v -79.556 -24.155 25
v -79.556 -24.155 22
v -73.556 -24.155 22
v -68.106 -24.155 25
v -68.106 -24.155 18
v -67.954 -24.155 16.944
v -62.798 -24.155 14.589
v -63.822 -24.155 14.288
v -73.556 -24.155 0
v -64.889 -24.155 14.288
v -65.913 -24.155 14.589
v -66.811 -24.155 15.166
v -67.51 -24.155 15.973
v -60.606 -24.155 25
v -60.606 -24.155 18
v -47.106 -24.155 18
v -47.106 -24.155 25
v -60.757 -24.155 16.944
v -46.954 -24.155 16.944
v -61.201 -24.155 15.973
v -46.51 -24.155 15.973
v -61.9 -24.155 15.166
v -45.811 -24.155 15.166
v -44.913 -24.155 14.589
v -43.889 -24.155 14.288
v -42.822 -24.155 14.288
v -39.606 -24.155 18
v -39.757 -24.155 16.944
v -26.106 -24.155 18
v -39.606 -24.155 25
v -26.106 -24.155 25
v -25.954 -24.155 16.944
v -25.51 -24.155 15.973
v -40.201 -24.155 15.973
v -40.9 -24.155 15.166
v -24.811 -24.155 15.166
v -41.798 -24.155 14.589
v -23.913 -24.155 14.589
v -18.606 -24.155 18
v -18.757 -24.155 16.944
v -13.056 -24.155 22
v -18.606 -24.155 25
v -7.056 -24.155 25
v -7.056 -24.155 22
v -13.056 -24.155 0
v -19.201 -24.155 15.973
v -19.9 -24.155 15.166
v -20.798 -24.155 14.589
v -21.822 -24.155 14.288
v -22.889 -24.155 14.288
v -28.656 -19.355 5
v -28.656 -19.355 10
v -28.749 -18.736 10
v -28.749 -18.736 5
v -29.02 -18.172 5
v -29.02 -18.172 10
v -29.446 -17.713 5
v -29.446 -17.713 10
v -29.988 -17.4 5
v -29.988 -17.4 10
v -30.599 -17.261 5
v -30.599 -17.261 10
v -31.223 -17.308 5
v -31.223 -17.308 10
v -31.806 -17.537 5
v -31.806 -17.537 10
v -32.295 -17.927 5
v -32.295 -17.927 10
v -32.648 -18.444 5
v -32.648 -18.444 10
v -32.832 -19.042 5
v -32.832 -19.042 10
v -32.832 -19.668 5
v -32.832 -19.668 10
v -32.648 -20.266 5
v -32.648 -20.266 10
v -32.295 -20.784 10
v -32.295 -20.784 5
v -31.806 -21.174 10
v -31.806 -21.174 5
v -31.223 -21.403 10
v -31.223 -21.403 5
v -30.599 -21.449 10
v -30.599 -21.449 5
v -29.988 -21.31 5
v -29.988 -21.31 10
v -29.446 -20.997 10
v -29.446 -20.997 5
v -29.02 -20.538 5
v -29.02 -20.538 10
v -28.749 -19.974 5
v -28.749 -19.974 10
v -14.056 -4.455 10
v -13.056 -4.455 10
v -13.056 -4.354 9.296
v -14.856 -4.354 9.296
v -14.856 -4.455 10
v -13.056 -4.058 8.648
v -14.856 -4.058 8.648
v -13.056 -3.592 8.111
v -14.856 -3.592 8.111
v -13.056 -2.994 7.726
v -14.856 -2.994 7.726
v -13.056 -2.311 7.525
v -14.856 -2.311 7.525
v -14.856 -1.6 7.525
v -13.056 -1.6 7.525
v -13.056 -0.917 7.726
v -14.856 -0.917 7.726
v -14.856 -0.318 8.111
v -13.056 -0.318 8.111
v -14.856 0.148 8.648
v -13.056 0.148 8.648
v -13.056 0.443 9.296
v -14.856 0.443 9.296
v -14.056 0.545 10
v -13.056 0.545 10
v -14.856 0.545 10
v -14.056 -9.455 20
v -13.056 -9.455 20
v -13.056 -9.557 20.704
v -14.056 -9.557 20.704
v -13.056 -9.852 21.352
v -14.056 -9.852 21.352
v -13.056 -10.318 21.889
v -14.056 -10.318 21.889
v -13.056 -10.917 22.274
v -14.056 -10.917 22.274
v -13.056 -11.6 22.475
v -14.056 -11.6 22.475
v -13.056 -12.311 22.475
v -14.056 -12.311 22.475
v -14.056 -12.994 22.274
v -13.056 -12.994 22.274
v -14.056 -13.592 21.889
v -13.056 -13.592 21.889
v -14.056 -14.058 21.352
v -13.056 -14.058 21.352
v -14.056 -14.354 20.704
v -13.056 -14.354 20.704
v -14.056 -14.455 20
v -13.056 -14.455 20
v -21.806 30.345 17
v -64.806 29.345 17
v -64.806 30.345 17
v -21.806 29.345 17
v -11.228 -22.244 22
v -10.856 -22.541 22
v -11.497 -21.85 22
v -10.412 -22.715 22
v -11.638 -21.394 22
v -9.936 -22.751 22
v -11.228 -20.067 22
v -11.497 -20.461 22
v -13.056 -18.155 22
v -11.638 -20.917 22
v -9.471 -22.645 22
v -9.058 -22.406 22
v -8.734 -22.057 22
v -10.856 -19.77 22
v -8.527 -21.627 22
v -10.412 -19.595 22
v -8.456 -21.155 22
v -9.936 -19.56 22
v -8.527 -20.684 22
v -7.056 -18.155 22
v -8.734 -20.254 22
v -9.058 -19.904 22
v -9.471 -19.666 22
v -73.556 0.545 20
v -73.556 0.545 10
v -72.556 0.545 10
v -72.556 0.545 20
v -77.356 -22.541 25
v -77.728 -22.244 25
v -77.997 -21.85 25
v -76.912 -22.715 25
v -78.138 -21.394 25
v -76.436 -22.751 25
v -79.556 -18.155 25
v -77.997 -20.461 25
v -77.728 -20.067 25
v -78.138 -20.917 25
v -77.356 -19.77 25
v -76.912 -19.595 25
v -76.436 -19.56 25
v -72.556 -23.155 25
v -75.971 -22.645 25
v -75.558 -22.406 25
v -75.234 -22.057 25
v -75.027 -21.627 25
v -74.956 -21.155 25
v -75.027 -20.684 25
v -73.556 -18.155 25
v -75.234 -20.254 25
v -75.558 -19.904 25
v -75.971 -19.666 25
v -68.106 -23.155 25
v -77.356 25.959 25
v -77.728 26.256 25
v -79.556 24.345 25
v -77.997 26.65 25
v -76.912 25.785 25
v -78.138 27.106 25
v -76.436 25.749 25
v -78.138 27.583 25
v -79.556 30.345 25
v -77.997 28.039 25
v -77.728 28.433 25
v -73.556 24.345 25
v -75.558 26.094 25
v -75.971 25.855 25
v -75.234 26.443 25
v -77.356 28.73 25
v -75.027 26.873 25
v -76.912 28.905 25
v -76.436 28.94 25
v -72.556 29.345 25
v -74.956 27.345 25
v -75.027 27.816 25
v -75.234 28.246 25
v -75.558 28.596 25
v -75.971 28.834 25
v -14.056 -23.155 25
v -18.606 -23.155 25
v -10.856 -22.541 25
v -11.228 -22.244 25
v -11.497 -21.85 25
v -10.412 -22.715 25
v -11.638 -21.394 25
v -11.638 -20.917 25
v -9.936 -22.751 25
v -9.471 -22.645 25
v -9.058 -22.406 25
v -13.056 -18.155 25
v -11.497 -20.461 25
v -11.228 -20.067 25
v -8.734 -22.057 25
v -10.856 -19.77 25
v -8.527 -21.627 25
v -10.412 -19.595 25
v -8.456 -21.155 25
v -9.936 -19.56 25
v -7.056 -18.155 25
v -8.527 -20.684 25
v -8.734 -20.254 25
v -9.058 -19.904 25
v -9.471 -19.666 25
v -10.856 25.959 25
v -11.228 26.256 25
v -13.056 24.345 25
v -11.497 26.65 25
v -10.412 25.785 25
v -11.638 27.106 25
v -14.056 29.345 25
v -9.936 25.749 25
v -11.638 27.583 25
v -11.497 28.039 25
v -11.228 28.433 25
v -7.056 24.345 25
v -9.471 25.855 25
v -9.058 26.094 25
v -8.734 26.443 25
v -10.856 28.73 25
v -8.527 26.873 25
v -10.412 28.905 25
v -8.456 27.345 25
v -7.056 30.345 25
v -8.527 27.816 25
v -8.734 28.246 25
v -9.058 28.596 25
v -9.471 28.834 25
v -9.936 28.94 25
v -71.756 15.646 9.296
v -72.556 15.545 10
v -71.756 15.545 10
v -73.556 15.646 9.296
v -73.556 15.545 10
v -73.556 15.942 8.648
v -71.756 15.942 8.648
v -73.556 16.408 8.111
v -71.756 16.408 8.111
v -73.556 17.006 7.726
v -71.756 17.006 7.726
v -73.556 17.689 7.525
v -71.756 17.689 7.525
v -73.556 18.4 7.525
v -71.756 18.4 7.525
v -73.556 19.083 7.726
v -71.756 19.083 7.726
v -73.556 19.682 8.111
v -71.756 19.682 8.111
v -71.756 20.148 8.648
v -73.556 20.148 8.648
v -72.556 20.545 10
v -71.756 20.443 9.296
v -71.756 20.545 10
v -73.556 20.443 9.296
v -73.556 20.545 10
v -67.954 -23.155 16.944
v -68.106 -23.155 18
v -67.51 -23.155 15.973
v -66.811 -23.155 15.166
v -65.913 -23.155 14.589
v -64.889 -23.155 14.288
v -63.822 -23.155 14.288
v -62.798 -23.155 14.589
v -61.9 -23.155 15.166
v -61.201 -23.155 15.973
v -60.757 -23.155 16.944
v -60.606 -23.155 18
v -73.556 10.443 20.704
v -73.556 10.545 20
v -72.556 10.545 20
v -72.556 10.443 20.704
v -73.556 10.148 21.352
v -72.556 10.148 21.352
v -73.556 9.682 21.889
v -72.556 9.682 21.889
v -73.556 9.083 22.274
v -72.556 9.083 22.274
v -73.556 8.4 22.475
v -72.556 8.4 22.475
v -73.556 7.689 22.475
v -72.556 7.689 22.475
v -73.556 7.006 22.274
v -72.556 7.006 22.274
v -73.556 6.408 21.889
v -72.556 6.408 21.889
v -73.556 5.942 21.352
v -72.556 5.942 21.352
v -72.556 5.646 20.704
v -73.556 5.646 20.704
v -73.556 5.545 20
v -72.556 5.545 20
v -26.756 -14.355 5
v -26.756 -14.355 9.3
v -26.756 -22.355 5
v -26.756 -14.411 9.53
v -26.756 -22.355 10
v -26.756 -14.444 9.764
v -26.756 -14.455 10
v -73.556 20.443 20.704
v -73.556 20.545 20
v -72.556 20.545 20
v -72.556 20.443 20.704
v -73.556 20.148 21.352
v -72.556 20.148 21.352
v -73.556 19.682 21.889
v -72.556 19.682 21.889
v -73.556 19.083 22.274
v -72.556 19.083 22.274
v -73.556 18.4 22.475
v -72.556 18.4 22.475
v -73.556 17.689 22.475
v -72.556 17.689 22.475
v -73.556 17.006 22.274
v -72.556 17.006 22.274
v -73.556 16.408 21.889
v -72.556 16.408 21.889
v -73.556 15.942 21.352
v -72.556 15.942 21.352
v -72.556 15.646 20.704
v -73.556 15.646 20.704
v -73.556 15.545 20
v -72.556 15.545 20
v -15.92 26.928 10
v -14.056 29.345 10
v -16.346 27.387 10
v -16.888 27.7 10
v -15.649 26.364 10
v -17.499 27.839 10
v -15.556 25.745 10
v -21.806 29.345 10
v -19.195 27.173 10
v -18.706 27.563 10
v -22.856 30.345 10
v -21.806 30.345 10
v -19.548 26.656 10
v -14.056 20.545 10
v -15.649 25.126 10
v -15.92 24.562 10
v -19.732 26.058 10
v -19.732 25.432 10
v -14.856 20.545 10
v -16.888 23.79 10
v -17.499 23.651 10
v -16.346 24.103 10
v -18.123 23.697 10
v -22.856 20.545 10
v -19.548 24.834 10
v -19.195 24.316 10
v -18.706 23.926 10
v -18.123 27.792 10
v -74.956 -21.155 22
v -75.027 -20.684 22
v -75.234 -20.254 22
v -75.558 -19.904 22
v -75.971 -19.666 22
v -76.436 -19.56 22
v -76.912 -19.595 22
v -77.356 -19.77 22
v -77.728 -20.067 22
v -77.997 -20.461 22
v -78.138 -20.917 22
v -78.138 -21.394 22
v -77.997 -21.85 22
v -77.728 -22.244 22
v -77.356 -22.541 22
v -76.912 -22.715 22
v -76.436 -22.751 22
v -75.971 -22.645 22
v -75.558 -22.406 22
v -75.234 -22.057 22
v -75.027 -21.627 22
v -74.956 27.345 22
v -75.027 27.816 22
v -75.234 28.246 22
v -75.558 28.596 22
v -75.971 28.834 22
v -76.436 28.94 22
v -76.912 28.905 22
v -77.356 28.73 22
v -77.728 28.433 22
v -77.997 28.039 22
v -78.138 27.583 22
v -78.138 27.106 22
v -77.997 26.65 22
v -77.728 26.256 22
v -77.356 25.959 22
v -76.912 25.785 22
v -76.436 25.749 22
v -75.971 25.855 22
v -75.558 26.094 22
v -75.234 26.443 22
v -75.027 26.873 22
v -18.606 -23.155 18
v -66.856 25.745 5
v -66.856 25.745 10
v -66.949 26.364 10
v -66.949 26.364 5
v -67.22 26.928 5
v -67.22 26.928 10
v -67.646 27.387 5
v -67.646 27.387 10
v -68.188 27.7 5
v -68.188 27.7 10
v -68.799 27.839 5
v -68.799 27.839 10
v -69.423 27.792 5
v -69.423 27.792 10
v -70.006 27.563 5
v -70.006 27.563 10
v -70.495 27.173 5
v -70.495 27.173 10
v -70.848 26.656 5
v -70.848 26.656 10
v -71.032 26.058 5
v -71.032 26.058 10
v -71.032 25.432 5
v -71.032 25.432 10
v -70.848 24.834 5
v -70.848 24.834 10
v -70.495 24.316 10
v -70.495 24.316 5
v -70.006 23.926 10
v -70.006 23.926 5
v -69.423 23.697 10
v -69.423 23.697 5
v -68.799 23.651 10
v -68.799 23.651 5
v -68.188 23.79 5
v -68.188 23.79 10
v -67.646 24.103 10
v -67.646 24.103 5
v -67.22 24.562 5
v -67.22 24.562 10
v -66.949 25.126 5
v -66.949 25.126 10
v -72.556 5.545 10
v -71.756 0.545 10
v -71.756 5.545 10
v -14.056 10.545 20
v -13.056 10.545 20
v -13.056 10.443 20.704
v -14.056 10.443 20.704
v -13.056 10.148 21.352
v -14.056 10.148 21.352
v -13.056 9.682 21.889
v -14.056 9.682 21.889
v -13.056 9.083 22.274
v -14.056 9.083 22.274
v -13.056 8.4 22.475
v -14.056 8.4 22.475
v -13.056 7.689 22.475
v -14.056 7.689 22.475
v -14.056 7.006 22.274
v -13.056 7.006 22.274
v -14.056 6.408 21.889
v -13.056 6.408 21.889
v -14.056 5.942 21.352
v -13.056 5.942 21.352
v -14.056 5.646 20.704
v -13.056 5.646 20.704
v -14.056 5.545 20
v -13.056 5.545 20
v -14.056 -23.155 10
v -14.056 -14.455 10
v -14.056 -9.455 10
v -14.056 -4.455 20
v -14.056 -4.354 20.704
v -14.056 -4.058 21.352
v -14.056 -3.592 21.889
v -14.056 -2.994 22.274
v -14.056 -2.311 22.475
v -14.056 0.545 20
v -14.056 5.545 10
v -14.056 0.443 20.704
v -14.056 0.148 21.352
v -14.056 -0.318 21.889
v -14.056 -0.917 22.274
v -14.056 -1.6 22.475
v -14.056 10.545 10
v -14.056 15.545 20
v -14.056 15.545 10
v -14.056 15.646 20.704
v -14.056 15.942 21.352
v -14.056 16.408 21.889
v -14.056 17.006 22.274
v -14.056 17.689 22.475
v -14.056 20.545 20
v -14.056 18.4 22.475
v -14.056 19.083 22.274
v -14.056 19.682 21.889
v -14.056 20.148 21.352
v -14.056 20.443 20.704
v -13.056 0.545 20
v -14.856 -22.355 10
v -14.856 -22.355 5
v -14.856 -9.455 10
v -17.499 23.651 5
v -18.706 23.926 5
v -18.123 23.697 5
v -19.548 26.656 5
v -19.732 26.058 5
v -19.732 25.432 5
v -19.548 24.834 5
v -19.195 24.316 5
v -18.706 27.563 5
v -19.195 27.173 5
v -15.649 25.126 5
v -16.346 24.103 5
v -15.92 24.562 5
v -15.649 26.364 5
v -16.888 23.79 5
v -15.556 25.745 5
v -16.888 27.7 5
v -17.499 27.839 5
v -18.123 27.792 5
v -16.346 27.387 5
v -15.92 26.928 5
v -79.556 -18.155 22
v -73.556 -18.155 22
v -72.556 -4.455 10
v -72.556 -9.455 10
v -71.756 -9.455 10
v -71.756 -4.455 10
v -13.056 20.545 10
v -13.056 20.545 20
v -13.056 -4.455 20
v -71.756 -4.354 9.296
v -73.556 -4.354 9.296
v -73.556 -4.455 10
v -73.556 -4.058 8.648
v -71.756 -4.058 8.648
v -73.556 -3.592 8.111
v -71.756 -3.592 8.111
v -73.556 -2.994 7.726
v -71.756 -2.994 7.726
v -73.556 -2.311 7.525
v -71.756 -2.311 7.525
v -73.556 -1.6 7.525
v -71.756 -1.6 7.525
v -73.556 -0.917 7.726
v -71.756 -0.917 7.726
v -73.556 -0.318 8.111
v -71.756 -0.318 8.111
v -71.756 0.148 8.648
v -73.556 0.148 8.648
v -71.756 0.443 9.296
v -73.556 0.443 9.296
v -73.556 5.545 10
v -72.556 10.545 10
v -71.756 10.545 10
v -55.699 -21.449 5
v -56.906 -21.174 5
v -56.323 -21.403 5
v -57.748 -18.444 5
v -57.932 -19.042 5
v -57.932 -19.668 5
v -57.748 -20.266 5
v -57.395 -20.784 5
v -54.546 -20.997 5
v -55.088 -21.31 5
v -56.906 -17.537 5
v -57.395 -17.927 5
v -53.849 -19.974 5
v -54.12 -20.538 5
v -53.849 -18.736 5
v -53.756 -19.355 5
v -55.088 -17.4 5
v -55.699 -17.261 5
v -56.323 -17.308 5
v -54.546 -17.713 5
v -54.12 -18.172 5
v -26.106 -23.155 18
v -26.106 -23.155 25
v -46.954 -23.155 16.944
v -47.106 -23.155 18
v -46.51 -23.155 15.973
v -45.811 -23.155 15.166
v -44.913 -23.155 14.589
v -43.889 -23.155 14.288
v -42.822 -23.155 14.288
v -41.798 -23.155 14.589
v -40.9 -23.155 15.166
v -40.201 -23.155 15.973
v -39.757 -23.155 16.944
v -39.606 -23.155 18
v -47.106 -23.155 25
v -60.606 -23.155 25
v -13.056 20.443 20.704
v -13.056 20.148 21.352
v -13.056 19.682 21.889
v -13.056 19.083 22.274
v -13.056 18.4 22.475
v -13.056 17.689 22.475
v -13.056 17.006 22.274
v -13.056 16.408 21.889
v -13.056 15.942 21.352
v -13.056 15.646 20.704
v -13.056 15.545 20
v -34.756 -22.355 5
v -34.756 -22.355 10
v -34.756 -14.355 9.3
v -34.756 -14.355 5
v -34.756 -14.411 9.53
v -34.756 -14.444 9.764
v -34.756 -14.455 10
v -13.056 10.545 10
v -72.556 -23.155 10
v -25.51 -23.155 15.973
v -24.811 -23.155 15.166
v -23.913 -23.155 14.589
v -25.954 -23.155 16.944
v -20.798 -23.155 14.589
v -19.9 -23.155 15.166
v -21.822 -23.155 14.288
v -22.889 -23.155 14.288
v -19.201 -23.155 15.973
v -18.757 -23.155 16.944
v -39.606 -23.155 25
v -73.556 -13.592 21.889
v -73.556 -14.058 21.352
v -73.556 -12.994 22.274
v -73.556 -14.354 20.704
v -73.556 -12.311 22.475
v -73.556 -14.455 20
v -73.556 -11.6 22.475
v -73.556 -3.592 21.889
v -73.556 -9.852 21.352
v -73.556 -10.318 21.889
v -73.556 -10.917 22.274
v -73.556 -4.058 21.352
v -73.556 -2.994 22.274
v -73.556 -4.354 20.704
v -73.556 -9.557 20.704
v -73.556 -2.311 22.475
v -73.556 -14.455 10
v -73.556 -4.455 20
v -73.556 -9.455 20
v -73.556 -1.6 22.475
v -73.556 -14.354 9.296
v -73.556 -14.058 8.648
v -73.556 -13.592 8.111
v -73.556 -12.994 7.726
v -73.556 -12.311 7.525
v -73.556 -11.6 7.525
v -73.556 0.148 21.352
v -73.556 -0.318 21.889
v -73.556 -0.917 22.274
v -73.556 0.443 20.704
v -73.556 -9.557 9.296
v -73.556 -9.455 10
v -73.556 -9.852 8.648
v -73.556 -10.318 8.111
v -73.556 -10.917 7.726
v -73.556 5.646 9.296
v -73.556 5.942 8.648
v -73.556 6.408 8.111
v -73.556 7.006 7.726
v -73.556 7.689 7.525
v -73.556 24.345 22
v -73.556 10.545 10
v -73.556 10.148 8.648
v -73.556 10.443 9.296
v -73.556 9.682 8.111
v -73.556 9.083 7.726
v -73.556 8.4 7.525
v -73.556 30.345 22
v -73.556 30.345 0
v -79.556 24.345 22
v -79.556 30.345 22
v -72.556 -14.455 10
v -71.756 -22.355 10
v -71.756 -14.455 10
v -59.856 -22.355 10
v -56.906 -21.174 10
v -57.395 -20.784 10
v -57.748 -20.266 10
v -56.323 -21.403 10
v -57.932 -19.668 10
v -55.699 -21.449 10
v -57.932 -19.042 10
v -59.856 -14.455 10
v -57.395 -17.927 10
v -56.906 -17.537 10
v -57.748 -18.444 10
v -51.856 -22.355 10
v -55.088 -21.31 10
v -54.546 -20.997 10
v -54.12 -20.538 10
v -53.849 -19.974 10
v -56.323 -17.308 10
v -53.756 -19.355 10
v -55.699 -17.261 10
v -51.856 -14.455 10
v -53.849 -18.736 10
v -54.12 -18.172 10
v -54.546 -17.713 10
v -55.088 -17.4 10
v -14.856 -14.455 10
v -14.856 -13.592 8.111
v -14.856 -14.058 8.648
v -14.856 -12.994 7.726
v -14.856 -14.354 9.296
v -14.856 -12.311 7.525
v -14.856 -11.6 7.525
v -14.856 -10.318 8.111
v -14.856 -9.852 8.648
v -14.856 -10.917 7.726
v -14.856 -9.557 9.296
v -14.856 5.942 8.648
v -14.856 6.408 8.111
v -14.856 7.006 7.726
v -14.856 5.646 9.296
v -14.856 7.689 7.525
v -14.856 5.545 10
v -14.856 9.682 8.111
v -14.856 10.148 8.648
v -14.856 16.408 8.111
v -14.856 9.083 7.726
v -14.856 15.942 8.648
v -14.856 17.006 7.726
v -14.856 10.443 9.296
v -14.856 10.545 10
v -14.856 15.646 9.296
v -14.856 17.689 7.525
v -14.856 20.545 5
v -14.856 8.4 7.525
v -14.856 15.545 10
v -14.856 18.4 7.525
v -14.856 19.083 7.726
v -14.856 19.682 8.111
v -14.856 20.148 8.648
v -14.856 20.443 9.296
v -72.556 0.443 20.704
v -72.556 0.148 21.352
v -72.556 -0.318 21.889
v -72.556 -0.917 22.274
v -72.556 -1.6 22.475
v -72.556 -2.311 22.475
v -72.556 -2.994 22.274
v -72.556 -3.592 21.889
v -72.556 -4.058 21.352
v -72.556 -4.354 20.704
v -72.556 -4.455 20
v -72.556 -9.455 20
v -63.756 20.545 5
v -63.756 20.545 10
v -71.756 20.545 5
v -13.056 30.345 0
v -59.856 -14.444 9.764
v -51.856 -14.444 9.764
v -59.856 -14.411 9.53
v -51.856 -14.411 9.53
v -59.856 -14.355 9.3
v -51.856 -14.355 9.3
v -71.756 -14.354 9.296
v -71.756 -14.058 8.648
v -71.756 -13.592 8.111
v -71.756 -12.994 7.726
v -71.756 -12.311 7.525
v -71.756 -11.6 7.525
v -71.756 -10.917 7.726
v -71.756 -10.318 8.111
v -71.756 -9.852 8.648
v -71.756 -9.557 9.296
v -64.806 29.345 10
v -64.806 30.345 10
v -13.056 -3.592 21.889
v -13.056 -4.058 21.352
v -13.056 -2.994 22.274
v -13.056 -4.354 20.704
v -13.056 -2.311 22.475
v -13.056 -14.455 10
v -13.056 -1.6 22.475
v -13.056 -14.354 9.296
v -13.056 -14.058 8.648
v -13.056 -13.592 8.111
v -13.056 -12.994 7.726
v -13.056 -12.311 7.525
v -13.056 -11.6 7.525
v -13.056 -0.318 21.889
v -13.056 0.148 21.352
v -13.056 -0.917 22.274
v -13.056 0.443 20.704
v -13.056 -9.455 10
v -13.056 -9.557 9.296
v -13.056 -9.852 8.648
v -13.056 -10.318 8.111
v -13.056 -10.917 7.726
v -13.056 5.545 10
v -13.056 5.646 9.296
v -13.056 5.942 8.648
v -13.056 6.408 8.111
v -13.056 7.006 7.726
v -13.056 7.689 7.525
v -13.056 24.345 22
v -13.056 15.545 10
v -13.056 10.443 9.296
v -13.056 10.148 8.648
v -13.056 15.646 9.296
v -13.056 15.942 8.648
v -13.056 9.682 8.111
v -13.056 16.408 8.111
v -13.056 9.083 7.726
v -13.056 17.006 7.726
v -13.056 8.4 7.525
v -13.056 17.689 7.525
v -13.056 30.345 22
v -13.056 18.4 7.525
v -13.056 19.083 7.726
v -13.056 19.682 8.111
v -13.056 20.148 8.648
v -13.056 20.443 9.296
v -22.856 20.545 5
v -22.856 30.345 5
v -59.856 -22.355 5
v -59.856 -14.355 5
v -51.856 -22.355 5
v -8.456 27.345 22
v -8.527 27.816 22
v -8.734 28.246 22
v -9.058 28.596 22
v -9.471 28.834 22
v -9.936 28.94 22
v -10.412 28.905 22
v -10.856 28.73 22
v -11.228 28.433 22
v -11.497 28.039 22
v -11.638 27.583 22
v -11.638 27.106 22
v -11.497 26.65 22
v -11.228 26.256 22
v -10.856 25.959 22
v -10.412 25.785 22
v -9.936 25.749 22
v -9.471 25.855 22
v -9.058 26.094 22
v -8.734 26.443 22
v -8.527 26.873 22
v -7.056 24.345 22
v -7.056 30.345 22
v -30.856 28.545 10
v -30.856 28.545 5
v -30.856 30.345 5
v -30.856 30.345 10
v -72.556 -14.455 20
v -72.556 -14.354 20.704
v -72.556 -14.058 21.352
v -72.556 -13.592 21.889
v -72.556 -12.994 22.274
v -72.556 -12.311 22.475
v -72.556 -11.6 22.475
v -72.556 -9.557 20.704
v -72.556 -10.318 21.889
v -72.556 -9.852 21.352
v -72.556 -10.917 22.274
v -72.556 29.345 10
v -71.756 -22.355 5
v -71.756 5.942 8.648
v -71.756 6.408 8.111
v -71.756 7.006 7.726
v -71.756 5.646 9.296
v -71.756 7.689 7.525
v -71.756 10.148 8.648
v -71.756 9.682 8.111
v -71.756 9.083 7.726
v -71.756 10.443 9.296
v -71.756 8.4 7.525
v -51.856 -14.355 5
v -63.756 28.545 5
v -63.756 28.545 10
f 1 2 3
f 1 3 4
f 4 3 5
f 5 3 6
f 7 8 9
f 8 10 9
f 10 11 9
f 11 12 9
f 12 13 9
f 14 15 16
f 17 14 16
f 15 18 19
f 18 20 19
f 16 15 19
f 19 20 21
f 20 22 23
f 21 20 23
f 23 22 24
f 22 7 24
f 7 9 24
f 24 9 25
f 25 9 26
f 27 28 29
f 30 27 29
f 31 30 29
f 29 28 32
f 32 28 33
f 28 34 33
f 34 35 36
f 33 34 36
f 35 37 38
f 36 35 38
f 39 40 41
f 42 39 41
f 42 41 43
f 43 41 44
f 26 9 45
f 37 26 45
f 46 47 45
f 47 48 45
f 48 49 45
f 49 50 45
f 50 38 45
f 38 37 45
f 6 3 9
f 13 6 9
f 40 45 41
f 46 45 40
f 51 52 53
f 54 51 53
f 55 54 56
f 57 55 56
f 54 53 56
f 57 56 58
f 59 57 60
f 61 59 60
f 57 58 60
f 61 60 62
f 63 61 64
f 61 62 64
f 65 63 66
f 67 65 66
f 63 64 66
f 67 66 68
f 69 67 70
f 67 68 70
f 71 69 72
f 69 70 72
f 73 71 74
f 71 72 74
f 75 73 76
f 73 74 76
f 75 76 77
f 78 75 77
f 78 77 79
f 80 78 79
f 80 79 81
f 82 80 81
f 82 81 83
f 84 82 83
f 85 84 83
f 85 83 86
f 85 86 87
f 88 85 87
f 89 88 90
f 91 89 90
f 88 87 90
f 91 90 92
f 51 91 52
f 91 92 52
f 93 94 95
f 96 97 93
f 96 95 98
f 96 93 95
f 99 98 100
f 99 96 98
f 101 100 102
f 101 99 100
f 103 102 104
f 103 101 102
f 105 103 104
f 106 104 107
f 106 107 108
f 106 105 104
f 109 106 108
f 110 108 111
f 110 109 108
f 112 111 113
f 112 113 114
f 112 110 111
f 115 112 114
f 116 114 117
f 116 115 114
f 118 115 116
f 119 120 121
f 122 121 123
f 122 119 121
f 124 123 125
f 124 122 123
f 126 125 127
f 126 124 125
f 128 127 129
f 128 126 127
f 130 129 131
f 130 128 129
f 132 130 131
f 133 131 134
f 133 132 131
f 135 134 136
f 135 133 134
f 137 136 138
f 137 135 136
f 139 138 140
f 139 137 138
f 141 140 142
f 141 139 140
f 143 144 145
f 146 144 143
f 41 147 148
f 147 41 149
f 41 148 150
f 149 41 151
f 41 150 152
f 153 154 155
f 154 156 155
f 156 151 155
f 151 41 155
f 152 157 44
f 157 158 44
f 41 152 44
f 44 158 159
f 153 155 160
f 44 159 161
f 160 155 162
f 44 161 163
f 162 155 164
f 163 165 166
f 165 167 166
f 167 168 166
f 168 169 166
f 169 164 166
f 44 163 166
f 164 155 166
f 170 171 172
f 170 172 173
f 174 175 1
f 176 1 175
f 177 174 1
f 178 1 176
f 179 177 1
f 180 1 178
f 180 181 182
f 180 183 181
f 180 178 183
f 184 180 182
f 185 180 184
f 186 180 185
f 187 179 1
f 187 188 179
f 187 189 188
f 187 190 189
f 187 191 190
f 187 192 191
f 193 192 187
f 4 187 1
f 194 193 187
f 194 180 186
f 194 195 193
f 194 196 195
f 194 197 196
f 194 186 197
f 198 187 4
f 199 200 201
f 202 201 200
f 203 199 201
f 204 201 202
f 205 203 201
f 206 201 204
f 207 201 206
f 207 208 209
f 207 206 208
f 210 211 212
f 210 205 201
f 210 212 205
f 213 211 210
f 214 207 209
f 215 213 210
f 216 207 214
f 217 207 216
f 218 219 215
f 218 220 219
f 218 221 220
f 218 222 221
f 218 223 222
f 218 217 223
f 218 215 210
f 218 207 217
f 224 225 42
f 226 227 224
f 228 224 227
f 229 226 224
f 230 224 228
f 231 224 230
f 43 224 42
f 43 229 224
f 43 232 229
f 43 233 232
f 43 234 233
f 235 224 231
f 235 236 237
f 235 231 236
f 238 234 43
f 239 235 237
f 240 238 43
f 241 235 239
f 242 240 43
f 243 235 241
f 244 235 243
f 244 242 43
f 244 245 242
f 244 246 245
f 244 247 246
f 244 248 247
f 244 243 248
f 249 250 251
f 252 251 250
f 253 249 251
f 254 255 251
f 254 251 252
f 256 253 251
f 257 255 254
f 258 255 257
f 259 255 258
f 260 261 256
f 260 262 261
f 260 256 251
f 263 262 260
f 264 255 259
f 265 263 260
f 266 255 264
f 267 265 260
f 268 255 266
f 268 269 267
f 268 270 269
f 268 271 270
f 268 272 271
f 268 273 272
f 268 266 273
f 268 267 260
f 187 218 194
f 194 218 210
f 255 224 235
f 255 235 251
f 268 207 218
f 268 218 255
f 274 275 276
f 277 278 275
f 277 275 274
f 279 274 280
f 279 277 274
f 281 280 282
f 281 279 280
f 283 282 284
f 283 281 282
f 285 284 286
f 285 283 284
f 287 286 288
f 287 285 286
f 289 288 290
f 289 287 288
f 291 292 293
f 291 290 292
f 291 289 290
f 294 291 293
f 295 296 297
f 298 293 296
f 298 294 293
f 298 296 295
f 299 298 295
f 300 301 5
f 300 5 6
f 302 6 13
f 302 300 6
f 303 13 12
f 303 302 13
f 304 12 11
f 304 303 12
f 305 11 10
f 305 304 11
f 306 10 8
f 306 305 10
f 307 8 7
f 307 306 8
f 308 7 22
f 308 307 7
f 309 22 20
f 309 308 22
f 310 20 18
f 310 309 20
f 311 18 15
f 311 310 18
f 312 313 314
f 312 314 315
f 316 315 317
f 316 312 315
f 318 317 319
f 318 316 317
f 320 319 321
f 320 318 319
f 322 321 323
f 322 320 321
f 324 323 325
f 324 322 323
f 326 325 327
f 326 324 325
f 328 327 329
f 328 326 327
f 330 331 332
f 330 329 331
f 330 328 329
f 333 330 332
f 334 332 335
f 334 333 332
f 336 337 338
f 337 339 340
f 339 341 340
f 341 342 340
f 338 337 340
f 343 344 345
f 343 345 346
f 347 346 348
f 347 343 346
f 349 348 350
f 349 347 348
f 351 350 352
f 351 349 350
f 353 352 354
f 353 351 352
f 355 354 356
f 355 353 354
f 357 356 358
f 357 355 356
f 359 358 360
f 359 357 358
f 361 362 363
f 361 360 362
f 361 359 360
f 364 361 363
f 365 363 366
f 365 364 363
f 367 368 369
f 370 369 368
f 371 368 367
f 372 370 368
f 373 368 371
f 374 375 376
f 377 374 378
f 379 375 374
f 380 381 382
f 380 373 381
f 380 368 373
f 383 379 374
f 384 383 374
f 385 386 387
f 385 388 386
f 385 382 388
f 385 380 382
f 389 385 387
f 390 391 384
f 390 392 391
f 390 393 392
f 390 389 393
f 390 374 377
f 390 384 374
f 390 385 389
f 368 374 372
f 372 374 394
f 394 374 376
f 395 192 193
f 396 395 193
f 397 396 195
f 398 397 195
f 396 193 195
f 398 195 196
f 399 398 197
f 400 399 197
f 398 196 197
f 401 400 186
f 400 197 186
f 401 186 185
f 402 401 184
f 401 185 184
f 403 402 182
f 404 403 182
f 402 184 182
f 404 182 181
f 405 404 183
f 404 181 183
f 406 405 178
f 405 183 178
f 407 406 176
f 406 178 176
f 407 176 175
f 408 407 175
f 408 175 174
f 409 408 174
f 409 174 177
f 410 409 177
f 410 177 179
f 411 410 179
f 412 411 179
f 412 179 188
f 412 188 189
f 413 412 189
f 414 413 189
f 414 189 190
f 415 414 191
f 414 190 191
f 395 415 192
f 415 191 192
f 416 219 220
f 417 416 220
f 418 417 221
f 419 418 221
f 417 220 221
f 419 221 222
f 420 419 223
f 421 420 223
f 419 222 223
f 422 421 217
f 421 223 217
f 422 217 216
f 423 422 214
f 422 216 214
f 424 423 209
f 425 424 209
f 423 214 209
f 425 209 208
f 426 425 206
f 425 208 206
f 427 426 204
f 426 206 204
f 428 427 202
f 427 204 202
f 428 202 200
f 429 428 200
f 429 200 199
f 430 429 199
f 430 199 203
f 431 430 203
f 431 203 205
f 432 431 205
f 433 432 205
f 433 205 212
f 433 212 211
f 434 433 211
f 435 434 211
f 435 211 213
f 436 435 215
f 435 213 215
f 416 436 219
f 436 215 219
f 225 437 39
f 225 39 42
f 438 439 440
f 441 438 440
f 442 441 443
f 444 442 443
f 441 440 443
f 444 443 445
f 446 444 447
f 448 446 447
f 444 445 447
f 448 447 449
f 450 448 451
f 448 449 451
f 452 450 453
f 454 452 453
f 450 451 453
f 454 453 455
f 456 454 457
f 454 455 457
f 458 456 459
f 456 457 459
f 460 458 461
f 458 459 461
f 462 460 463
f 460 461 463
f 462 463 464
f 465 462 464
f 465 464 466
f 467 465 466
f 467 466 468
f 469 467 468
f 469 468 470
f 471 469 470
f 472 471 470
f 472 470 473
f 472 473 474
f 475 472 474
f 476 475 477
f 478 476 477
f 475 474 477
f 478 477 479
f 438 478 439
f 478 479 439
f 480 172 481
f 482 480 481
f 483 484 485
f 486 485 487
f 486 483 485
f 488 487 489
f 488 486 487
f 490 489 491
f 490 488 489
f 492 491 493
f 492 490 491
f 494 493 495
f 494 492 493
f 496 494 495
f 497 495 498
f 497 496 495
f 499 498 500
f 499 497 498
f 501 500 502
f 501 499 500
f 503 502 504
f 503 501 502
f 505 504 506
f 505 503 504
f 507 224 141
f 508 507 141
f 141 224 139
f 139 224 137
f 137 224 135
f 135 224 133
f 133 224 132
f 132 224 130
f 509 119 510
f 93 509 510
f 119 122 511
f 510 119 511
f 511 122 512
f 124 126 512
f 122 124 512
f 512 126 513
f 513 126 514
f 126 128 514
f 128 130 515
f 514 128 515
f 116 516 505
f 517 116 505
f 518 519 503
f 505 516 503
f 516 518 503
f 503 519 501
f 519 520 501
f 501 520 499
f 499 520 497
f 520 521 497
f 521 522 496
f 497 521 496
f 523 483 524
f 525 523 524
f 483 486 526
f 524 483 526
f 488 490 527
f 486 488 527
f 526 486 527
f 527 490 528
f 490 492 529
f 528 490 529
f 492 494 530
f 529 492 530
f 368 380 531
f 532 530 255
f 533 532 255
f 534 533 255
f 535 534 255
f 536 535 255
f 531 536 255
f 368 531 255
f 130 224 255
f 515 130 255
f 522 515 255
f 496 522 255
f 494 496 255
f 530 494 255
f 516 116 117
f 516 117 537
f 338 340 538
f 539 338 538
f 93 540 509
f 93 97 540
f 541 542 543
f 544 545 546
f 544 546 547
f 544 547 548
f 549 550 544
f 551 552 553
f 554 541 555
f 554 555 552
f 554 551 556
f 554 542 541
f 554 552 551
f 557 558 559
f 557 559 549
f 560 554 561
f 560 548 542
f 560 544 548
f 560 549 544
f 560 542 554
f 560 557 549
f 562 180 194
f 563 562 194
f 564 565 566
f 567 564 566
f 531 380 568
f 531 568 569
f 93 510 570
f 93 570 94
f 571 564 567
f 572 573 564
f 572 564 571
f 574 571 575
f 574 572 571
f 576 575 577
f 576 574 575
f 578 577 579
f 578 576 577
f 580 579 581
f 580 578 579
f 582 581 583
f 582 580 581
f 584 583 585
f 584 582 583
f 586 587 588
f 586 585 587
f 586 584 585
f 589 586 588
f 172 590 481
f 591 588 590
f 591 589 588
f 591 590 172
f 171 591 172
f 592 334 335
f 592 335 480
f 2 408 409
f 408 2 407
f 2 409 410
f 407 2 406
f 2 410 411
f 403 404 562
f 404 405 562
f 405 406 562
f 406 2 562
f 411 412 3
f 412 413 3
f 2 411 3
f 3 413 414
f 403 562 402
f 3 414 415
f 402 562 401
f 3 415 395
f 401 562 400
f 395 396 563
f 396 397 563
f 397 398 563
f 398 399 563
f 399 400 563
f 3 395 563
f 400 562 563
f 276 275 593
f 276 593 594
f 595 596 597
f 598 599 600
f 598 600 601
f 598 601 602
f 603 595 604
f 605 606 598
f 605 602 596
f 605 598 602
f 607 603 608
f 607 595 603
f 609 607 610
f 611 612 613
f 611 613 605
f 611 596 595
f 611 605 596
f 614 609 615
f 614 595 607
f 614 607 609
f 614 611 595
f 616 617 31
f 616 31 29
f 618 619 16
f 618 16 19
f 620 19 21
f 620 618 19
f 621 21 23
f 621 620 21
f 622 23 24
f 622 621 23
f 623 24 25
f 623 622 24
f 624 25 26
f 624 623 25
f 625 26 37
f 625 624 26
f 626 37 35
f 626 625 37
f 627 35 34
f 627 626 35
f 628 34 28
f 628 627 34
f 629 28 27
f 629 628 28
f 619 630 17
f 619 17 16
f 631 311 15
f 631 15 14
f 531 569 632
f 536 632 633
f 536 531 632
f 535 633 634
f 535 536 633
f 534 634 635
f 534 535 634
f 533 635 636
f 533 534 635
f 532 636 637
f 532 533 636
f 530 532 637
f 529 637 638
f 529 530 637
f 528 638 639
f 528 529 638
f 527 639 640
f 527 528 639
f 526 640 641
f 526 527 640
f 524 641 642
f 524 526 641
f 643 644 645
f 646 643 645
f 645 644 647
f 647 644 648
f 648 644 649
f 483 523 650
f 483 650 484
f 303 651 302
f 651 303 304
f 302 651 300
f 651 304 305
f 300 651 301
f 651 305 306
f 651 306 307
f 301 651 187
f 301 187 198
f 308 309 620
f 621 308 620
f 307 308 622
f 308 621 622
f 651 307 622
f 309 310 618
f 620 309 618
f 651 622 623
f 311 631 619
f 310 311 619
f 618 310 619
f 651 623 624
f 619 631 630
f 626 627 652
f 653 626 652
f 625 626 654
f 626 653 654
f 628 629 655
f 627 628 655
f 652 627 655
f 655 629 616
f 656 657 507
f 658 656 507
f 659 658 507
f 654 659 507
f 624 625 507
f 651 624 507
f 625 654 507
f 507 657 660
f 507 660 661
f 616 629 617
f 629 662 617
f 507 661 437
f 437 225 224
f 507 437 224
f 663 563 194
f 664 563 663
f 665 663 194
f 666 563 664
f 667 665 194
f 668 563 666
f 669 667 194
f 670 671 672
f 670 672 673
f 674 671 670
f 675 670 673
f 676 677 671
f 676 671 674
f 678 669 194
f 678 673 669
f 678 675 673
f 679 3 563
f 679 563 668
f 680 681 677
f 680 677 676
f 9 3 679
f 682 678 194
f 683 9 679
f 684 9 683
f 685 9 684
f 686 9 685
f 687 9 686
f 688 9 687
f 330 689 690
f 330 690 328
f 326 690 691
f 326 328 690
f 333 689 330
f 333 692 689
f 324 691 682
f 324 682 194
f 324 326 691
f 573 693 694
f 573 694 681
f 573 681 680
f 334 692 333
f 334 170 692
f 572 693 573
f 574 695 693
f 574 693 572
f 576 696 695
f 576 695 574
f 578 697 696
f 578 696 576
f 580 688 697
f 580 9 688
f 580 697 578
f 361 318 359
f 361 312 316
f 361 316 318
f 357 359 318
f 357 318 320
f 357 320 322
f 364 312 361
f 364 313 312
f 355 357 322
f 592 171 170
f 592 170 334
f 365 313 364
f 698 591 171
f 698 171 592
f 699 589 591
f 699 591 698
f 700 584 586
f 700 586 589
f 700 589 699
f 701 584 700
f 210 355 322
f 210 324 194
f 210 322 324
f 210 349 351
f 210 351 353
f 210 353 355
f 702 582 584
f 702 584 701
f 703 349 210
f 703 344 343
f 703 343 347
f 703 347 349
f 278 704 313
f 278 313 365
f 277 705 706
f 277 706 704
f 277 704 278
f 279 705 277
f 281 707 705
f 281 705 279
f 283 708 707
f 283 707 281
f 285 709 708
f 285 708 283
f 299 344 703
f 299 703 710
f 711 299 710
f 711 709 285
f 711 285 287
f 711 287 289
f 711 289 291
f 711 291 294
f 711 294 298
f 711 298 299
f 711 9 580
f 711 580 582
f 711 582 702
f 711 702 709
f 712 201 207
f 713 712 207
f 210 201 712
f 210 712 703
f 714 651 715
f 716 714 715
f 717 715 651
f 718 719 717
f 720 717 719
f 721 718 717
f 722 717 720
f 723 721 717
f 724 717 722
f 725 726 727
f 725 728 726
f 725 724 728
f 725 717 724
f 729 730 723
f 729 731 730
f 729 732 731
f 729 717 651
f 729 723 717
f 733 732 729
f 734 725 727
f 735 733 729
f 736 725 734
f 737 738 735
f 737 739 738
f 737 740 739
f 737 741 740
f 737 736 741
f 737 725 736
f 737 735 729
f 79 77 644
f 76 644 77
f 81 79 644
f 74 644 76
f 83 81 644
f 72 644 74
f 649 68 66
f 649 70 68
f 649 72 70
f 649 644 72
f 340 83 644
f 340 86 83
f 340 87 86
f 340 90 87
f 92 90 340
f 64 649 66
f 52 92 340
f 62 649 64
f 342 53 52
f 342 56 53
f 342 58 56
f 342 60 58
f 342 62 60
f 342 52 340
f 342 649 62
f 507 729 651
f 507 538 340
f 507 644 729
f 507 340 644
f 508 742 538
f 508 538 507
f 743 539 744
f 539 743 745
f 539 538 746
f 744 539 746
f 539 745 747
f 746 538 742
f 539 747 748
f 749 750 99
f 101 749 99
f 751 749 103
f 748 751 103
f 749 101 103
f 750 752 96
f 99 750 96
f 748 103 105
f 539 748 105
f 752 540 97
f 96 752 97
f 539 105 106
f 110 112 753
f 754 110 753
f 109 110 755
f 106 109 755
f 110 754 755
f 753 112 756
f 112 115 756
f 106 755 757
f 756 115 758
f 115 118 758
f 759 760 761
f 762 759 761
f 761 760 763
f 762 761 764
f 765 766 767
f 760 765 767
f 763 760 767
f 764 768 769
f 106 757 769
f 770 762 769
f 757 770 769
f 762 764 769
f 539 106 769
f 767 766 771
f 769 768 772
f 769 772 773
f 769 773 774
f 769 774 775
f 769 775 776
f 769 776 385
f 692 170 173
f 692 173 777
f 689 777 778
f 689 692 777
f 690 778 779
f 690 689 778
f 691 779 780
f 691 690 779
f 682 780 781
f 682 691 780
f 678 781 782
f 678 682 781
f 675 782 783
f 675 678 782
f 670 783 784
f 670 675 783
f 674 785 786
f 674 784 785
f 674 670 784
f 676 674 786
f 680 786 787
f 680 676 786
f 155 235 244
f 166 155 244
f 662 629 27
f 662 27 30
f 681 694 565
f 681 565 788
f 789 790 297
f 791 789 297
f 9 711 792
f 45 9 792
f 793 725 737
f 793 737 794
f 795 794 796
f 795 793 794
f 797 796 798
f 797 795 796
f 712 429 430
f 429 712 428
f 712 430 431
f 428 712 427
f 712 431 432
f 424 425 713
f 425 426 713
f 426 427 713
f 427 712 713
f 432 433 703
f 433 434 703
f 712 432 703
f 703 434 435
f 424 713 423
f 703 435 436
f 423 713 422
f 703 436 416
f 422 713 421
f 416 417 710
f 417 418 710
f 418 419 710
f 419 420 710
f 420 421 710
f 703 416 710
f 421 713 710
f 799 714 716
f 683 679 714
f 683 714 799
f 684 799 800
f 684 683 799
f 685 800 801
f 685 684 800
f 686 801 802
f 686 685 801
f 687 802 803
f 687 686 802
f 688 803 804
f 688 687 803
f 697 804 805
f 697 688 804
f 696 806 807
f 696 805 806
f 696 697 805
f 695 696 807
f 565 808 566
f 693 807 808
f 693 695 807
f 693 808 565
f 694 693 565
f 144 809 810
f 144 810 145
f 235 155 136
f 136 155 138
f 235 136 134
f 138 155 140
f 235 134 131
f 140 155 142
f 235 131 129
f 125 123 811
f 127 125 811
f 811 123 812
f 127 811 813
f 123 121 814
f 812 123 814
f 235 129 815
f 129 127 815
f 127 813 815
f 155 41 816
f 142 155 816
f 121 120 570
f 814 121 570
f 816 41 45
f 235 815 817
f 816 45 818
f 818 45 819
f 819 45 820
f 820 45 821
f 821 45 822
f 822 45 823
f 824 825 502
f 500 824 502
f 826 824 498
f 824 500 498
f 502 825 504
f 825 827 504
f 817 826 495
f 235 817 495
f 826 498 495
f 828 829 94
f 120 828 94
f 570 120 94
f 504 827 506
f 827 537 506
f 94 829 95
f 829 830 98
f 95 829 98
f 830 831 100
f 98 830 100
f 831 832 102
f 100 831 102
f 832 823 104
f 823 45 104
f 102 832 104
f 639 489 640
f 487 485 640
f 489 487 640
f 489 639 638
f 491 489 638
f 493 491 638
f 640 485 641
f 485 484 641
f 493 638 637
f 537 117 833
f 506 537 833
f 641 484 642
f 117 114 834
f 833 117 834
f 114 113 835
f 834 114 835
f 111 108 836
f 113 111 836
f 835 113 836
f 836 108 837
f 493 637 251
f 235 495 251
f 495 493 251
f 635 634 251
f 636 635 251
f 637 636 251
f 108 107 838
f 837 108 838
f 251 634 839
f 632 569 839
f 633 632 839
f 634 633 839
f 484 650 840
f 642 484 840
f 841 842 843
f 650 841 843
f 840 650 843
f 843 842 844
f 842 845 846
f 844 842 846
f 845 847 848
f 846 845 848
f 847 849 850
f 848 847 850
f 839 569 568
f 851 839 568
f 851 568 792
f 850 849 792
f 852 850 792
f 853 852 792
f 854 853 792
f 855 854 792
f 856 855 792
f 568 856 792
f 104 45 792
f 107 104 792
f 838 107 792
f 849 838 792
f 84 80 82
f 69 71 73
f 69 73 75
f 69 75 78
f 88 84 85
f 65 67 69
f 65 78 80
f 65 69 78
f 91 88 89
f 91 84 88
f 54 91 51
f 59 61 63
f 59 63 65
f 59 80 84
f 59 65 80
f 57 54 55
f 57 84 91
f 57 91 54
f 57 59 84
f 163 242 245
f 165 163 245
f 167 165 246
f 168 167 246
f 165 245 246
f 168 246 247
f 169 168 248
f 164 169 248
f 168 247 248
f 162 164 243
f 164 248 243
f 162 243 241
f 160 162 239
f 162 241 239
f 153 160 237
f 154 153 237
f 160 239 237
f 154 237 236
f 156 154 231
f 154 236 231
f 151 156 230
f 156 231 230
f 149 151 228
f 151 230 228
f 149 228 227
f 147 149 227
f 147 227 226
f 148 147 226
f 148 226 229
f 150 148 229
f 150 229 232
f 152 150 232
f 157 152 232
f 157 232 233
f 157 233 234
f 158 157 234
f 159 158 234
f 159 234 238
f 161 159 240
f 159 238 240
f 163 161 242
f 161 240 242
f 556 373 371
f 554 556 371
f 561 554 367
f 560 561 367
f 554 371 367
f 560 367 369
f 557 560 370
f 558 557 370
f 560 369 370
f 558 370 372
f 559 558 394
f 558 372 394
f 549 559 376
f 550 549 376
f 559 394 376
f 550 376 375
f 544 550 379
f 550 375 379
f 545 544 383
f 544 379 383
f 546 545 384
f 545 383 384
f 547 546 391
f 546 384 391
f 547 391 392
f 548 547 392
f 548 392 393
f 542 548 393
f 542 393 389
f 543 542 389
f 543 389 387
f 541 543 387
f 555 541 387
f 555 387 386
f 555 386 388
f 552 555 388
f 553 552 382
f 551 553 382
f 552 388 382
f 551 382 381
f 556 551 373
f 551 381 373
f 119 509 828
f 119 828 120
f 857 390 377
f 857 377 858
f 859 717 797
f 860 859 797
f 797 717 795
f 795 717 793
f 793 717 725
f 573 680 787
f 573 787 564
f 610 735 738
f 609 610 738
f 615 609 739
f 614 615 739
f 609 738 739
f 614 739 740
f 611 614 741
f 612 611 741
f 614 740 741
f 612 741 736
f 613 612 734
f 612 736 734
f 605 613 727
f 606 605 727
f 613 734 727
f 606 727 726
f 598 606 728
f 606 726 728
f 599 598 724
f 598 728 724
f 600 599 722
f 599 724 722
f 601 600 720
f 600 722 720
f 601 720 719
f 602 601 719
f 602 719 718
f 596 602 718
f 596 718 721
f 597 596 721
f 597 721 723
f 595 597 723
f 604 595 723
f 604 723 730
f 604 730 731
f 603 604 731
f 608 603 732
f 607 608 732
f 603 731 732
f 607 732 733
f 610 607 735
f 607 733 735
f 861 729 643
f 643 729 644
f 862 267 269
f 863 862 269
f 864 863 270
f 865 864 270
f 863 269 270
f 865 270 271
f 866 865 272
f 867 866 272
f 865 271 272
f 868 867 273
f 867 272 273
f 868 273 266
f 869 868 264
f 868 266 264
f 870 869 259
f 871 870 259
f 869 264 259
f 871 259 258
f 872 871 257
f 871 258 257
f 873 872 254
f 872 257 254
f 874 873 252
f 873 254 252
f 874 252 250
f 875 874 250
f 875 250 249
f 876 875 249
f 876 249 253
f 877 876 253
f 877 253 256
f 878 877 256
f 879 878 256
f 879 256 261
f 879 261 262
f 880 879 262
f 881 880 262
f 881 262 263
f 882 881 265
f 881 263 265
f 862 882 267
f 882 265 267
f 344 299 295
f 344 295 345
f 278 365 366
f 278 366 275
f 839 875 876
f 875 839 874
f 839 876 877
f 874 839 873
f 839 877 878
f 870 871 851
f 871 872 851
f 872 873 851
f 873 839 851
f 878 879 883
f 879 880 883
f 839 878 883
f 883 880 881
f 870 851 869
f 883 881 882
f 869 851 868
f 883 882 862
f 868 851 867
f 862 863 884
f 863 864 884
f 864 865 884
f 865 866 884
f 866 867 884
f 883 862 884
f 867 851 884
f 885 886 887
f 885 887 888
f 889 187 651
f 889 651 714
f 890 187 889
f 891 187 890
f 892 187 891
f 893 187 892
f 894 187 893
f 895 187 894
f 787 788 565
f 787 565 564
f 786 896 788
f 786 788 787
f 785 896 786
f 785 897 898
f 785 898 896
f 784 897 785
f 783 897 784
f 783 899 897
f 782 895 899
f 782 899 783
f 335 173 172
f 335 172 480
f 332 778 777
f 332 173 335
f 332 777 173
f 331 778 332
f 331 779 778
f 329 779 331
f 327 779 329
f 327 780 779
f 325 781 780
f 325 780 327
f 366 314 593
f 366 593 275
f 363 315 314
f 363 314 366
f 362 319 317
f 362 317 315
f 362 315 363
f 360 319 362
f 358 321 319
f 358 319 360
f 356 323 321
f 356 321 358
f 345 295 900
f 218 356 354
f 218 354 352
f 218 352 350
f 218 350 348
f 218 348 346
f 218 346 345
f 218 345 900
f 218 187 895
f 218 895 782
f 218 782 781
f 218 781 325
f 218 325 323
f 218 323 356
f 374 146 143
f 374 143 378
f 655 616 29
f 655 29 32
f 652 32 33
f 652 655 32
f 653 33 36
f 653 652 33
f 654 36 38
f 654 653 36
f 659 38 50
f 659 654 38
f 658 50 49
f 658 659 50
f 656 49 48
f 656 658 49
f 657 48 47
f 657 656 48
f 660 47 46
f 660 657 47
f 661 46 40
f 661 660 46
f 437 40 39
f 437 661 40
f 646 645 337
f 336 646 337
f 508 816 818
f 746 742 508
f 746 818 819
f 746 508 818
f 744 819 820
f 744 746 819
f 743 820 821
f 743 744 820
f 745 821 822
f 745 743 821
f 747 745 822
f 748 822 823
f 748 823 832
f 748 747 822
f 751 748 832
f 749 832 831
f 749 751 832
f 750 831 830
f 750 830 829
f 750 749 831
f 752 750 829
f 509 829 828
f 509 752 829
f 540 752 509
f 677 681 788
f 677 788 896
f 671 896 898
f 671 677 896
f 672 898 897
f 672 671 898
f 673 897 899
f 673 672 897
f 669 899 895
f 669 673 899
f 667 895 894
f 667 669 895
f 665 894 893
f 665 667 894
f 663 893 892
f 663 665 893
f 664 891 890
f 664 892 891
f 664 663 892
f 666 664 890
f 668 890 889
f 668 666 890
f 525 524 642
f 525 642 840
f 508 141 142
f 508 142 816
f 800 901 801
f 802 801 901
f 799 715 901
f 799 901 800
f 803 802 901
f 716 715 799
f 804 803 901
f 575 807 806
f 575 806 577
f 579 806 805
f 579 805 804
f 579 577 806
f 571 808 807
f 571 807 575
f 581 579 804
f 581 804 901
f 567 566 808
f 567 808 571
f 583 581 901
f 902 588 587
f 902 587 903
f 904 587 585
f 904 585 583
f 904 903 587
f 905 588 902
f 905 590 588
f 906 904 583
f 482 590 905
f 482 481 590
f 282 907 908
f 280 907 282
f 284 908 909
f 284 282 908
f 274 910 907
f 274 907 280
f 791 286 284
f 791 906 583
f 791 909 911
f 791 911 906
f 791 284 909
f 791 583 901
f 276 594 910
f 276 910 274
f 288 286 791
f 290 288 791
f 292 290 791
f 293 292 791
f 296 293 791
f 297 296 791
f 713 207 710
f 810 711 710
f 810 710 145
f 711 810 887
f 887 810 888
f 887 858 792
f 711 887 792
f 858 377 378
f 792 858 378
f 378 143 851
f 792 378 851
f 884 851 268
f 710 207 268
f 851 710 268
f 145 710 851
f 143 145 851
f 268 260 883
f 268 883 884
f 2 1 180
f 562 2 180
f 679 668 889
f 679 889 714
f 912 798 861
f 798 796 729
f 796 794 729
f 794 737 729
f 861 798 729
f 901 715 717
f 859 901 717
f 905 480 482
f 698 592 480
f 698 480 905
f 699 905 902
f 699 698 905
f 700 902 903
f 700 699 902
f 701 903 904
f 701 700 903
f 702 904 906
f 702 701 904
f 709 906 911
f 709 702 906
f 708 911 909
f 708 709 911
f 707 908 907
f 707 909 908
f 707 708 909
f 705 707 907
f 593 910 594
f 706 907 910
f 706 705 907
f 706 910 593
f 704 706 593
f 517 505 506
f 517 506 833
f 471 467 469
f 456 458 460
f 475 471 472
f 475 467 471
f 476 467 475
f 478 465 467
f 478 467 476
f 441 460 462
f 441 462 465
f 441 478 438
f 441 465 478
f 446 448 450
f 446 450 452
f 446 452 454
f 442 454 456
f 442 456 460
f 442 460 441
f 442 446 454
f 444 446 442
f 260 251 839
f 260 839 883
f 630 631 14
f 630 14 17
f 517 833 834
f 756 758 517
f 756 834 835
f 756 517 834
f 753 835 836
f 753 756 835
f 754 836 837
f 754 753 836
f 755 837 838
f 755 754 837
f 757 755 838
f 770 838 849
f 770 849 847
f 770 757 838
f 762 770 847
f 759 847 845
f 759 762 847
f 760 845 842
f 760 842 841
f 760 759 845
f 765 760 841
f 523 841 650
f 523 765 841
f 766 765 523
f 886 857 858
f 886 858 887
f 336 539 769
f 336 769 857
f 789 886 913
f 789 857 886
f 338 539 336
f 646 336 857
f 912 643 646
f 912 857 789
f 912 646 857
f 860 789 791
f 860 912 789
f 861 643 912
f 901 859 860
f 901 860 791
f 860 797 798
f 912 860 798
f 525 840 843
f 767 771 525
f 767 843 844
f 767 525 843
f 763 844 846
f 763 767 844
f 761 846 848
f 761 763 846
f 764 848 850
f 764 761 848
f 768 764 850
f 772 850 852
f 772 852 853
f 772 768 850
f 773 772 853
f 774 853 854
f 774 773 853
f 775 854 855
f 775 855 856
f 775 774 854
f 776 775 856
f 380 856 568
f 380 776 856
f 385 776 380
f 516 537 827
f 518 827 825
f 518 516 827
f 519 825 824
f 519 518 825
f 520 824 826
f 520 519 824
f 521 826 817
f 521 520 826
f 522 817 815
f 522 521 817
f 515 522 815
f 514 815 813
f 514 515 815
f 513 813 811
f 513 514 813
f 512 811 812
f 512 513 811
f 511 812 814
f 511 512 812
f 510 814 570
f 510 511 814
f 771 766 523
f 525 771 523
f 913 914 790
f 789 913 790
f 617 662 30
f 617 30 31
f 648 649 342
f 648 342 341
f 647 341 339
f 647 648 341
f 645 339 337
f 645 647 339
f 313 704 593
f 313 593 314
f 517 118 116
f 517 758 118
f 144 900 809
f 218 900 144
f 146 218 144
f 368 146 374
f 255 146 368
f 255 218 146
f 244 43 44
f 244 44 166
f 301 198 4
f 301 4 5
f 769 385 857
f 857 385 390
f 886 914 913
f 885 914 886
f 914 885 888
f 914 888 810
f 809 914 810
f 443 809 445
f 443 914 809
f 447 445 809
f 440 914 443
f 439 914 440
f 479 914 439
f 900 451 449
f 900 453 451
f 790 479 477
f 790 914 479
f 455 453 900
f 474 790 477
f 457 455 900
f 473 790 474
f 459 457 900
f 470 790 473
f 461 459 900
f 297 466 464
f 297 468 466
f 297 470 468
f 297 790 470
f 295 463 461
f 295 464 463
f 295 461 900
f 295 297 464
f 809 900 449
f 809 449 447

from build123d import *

# Parameters (mm, degrees)
CROQUIS1_W              = 60.5
CROQUIS1_H              = 54.5
SALIENTE_EXTRUIR1_DEPTH = 25
CROQUIS2_W              = 56.9
CROQUIS2_H              = 50.9
CORTAR_EXTRUIR1_DEPTH   = 15
CROQUIS3_R              = 2.1
CORTAR_EXTRUIR2_DEPTH   = 5
CORTAR_EXTRUIR3_DEPTH   = 5
CORTAR_EXTRUIR4_DEPTH   = 1.8
CORTAR_EXTRUIR6_START   = -1.8
CORTAR_EXTRUIR6_DEPTH   = 60.5
CROQUIS10_W             = 6
CROQUIS10_H             = 6
CROQUIS10_R             = 1.6
SALIENTE_EXTRUIR2_DEPTH = 3
CROQUIS11_W             = 58.5
CROQUIS11_H             = 52.5
CORTAR_EXTRUIR7_DEPTH   = 15


with BuildPart() as part:
    # Croquis1 → Saliente-Extruir1 (new body)
    with BuildSketch(Plane.XY):
        with Locations((-43.305557703, 3.094674556)):
            Rectangle(CROQUIS1_W, CROQUIS1_H)
    extrude(amount=SALIENTE_EXTRUIR1_DEPTH)

    # Croquis2 → Cortar-Extruir1 (cut)
    with BuildSketch(Plane.XY.offset(25)):
        with Locations((-43.305557703, 3.094674556)):
            Rectangle(CROQUIS2_W, CROQUIS2_H)
    extrude(amount=-CORTAR_EXTRUIR1_DEPTH, mode=Mode.SUBTRACT)

    # Croquis3 → Cortar-Extruir2 (cut)
    with BuildSketch(Plane.XY.offset(10)):
        with Locations((-68.955557703, 25.744674556)):
            Circle(CROQUIS3_R)
        with Locations((-55.855557703, -19.355325444)):
            Circle(CROQUIS3_R)
        with Locations((-30.755557703, -19.355325444)):
            Circle(CROQUIS3_R)
        with Locations((-17.655557703, 25.744674556)):
            Circle(CROQUIS3_R)
        Polygon((-71.755557703, 20.544674556), (-71.755557703, -22.355325444), (-59.855557703, -22.355325444), (-59.855557703, -14.355325444), (-51.855557703, -14.355325444), (-51.855557703, -22.355325444), (-34.755557703, -22.355325444), (-34.755557703, -14.355325444), (-26.755557703, -14.355325444), (-26.755557703, -22.355325444), (-14.855557703, -22.355325444), (-14.855557703, 20.544674556), (-22.855557703, 20.544674556), (-22.855557703, 28.544674556), (-63.755557703, 28.544674556), (-63.755557703, 20.544674556), align=None)
    extrude(amount=-CORTAR_EXTRUIR2_DEPTH, mode=Mode.SUBTRACT)

    # Croquis5 → Cortar-Extruir3 (cut)
    with BuildSketch(Plane(origin=(0, -22.355325444, 0), x_dir=(1, 0, 0), z_dir=(0, 1, 0))):
        with BuildLine():
            Line((-18.605557703, -18), (-18.605557703, -25))
            Line((-18.605557703, -25), (-26.105557703, -25))
            Line((-26.105557703, -25), (-26.105557703, -18))
            ThreePointArc((-26.105557703, -18), (-22.355557703, -14.25), (-18.605557703, -18))
        make_face()
        with BuildLine():
            Line((-39.605557703, -18), (-39.605557703, -25))
            Line((-39.605557703, -25), (-47.105557703, -25))
            Line((-47.105557703, -25), (-47.105557703, -18))
            ThreePointArc((-47.105557703, -18), (-43.355557703, -14.25), (-39.605557703, -18))
        make_face()
        with BuildLine():
            Line((-60.605557703, -18), (-60.605557703, -25))
            Line((-60.605557703, -25), (-68.105557703, -25))
            Line((-68.105557703, -25), (-68.105557703, -18))
            ThreePointArc((-68.105557703, -18), (-64.355557703, -14.25), (-60.605557703, -18))
        make_face()
    extrude(amount=-CORTAR_EXTRUIR3_DEPTH, mode=Mode.SUBTRACT)

    # Croquis6 → Cortar-Extruir4 (cut)
    with BuildSketch(Plane.XZ.offset(-28.544674556)):
        Polygon((-64.805557703, 17), (-21.805557703, 17), (-21.805557703, 10), (-22.855557703, 10), (-22.855557703, 5), (-30.855557703, 5), (-30.855557703, 10), (-64.805557703, 10), align=None)
    extrude(amount=-CORTAR_EXTRUIR4_DEPTH, mode=Mode.SUBTRACT)

    # Croquis9 → Cortar-Extruir6 (cut)
    with BuildSketch(Plane(origin=(-71.755557703, 0, 0), x_dir=(0, 0, -1), z_dir=(1, 0, 0)).offset(CORTAR_EXTRUIR6_START)):
        with BuildLine():
            Line((-10, 20.544674556), (-20, 20.544674556))
            ThreePointArc((-20, 20.544674556), (-22.5, 18.044674556), (-20, 15.544674556))
            Line((-20, 15.544674556), (-10, 15.544674556))
            ThreePointArc((-10, 15.544674556), (-7.5, 18.044674556), (-10, 20.544674556))
        make_face()
        with BuildLine():
            Line((-10, 10.544674556), (-20, 10.544674556))
            ThreePointArc((-20, 10.544674556), (-22.5, 8.044674556), (-20, 5.544674556))
            Line((-20, 5.544674556), (-10, 5.544674556))
            ThreePointArc((-10, 5.544674556), (-7.5, 8.044674556), (-10, 10.544674556))
        make_face()
        with BuildLine():
            Line((-10, 0.544674556), (-20, 0.544674556))
            ThreePointArc((-20, 0.544674556), (-22.5, -1.955325444), (-20, -4.455325444))
            Line((-20, -4.455325444), (-10, -4.455325444))
            ThreePointArc((-10, -4.455325444), (-7.5, -1.955325444), (-10, 0.544674556))
        make_face()
        with BuildLine():
            Line((-10, -9.455325444), (-20, -9.455325444))
            ThreePointArc((-20, -9.455325444), (-22.5, -11.955325444), (-20, -14.455325444))
            Line((-20, -14.455325444), (-10, -14.455325444))
            ThreePointArc((-10, -14.455325444), (-7.5, -11.955325444), (-10, -9.455325444))
        make_face()
    extrude(amount=CORTAR_EXTRUIR6_DEPTH, mode=Mode.SUBTRACT)

    # Croquis10 → Saliente-Extruir2 (add)
    with BuildSketch(Plane.XY.offset(25)):
        with Locations((-76.555557703, 27.344674556)):
            Rectangle(CROQUIS10_W, CROQUIS10_H)
        with Locations((-76.555557703, 27.344674556)):
            Circle(CROQUIS10_R, mode=Mode.SUBTRACT)
        with Locations((-10.055557703, 27.344674556)):
            Rectangle(CROQUIS10_W, CROQUIS10_H)
        with Locations((-10.055557703, 27.344674556)):
            Circle(CROQUIS10_R, mode=Mode.SUBTRACT)
        with Locations((-10.055557703, -21.155325444)):
            Rectangle(CROQUIS10_W, CROQUIS10_H)
        with Locations((-10.055557703, -21.155325444)):
            Circle(CROQUIS10_R, mode=Mode.SUBTRACT)
        with Locations((-76.555557703, -21.155325444)):
            Rectangle(CROQUIS10_W, CROQUIS10_H)
        with Locations((-76.555557703, -21.155325444)):
            Circle(CROQUIS10_R, mode=Mode.SUBTRACT)
    extrude(amount=-SALIENTE_EXTRUIR2_DEPTH)

    # Croquis11 → Cortar-Extruir7 (cut)
    with BuildSketch(Plane.XY.offset(25)):
        with Locations((-43.305557703, 3.094674556)):
            Rectangle(CROQUIS11_W, CROQUIS11_H)
    extrude(amount=-CORTAR_EXTRUIR7_DEPTH, mode=Mode.SUBTRACT)


solid = part.part
